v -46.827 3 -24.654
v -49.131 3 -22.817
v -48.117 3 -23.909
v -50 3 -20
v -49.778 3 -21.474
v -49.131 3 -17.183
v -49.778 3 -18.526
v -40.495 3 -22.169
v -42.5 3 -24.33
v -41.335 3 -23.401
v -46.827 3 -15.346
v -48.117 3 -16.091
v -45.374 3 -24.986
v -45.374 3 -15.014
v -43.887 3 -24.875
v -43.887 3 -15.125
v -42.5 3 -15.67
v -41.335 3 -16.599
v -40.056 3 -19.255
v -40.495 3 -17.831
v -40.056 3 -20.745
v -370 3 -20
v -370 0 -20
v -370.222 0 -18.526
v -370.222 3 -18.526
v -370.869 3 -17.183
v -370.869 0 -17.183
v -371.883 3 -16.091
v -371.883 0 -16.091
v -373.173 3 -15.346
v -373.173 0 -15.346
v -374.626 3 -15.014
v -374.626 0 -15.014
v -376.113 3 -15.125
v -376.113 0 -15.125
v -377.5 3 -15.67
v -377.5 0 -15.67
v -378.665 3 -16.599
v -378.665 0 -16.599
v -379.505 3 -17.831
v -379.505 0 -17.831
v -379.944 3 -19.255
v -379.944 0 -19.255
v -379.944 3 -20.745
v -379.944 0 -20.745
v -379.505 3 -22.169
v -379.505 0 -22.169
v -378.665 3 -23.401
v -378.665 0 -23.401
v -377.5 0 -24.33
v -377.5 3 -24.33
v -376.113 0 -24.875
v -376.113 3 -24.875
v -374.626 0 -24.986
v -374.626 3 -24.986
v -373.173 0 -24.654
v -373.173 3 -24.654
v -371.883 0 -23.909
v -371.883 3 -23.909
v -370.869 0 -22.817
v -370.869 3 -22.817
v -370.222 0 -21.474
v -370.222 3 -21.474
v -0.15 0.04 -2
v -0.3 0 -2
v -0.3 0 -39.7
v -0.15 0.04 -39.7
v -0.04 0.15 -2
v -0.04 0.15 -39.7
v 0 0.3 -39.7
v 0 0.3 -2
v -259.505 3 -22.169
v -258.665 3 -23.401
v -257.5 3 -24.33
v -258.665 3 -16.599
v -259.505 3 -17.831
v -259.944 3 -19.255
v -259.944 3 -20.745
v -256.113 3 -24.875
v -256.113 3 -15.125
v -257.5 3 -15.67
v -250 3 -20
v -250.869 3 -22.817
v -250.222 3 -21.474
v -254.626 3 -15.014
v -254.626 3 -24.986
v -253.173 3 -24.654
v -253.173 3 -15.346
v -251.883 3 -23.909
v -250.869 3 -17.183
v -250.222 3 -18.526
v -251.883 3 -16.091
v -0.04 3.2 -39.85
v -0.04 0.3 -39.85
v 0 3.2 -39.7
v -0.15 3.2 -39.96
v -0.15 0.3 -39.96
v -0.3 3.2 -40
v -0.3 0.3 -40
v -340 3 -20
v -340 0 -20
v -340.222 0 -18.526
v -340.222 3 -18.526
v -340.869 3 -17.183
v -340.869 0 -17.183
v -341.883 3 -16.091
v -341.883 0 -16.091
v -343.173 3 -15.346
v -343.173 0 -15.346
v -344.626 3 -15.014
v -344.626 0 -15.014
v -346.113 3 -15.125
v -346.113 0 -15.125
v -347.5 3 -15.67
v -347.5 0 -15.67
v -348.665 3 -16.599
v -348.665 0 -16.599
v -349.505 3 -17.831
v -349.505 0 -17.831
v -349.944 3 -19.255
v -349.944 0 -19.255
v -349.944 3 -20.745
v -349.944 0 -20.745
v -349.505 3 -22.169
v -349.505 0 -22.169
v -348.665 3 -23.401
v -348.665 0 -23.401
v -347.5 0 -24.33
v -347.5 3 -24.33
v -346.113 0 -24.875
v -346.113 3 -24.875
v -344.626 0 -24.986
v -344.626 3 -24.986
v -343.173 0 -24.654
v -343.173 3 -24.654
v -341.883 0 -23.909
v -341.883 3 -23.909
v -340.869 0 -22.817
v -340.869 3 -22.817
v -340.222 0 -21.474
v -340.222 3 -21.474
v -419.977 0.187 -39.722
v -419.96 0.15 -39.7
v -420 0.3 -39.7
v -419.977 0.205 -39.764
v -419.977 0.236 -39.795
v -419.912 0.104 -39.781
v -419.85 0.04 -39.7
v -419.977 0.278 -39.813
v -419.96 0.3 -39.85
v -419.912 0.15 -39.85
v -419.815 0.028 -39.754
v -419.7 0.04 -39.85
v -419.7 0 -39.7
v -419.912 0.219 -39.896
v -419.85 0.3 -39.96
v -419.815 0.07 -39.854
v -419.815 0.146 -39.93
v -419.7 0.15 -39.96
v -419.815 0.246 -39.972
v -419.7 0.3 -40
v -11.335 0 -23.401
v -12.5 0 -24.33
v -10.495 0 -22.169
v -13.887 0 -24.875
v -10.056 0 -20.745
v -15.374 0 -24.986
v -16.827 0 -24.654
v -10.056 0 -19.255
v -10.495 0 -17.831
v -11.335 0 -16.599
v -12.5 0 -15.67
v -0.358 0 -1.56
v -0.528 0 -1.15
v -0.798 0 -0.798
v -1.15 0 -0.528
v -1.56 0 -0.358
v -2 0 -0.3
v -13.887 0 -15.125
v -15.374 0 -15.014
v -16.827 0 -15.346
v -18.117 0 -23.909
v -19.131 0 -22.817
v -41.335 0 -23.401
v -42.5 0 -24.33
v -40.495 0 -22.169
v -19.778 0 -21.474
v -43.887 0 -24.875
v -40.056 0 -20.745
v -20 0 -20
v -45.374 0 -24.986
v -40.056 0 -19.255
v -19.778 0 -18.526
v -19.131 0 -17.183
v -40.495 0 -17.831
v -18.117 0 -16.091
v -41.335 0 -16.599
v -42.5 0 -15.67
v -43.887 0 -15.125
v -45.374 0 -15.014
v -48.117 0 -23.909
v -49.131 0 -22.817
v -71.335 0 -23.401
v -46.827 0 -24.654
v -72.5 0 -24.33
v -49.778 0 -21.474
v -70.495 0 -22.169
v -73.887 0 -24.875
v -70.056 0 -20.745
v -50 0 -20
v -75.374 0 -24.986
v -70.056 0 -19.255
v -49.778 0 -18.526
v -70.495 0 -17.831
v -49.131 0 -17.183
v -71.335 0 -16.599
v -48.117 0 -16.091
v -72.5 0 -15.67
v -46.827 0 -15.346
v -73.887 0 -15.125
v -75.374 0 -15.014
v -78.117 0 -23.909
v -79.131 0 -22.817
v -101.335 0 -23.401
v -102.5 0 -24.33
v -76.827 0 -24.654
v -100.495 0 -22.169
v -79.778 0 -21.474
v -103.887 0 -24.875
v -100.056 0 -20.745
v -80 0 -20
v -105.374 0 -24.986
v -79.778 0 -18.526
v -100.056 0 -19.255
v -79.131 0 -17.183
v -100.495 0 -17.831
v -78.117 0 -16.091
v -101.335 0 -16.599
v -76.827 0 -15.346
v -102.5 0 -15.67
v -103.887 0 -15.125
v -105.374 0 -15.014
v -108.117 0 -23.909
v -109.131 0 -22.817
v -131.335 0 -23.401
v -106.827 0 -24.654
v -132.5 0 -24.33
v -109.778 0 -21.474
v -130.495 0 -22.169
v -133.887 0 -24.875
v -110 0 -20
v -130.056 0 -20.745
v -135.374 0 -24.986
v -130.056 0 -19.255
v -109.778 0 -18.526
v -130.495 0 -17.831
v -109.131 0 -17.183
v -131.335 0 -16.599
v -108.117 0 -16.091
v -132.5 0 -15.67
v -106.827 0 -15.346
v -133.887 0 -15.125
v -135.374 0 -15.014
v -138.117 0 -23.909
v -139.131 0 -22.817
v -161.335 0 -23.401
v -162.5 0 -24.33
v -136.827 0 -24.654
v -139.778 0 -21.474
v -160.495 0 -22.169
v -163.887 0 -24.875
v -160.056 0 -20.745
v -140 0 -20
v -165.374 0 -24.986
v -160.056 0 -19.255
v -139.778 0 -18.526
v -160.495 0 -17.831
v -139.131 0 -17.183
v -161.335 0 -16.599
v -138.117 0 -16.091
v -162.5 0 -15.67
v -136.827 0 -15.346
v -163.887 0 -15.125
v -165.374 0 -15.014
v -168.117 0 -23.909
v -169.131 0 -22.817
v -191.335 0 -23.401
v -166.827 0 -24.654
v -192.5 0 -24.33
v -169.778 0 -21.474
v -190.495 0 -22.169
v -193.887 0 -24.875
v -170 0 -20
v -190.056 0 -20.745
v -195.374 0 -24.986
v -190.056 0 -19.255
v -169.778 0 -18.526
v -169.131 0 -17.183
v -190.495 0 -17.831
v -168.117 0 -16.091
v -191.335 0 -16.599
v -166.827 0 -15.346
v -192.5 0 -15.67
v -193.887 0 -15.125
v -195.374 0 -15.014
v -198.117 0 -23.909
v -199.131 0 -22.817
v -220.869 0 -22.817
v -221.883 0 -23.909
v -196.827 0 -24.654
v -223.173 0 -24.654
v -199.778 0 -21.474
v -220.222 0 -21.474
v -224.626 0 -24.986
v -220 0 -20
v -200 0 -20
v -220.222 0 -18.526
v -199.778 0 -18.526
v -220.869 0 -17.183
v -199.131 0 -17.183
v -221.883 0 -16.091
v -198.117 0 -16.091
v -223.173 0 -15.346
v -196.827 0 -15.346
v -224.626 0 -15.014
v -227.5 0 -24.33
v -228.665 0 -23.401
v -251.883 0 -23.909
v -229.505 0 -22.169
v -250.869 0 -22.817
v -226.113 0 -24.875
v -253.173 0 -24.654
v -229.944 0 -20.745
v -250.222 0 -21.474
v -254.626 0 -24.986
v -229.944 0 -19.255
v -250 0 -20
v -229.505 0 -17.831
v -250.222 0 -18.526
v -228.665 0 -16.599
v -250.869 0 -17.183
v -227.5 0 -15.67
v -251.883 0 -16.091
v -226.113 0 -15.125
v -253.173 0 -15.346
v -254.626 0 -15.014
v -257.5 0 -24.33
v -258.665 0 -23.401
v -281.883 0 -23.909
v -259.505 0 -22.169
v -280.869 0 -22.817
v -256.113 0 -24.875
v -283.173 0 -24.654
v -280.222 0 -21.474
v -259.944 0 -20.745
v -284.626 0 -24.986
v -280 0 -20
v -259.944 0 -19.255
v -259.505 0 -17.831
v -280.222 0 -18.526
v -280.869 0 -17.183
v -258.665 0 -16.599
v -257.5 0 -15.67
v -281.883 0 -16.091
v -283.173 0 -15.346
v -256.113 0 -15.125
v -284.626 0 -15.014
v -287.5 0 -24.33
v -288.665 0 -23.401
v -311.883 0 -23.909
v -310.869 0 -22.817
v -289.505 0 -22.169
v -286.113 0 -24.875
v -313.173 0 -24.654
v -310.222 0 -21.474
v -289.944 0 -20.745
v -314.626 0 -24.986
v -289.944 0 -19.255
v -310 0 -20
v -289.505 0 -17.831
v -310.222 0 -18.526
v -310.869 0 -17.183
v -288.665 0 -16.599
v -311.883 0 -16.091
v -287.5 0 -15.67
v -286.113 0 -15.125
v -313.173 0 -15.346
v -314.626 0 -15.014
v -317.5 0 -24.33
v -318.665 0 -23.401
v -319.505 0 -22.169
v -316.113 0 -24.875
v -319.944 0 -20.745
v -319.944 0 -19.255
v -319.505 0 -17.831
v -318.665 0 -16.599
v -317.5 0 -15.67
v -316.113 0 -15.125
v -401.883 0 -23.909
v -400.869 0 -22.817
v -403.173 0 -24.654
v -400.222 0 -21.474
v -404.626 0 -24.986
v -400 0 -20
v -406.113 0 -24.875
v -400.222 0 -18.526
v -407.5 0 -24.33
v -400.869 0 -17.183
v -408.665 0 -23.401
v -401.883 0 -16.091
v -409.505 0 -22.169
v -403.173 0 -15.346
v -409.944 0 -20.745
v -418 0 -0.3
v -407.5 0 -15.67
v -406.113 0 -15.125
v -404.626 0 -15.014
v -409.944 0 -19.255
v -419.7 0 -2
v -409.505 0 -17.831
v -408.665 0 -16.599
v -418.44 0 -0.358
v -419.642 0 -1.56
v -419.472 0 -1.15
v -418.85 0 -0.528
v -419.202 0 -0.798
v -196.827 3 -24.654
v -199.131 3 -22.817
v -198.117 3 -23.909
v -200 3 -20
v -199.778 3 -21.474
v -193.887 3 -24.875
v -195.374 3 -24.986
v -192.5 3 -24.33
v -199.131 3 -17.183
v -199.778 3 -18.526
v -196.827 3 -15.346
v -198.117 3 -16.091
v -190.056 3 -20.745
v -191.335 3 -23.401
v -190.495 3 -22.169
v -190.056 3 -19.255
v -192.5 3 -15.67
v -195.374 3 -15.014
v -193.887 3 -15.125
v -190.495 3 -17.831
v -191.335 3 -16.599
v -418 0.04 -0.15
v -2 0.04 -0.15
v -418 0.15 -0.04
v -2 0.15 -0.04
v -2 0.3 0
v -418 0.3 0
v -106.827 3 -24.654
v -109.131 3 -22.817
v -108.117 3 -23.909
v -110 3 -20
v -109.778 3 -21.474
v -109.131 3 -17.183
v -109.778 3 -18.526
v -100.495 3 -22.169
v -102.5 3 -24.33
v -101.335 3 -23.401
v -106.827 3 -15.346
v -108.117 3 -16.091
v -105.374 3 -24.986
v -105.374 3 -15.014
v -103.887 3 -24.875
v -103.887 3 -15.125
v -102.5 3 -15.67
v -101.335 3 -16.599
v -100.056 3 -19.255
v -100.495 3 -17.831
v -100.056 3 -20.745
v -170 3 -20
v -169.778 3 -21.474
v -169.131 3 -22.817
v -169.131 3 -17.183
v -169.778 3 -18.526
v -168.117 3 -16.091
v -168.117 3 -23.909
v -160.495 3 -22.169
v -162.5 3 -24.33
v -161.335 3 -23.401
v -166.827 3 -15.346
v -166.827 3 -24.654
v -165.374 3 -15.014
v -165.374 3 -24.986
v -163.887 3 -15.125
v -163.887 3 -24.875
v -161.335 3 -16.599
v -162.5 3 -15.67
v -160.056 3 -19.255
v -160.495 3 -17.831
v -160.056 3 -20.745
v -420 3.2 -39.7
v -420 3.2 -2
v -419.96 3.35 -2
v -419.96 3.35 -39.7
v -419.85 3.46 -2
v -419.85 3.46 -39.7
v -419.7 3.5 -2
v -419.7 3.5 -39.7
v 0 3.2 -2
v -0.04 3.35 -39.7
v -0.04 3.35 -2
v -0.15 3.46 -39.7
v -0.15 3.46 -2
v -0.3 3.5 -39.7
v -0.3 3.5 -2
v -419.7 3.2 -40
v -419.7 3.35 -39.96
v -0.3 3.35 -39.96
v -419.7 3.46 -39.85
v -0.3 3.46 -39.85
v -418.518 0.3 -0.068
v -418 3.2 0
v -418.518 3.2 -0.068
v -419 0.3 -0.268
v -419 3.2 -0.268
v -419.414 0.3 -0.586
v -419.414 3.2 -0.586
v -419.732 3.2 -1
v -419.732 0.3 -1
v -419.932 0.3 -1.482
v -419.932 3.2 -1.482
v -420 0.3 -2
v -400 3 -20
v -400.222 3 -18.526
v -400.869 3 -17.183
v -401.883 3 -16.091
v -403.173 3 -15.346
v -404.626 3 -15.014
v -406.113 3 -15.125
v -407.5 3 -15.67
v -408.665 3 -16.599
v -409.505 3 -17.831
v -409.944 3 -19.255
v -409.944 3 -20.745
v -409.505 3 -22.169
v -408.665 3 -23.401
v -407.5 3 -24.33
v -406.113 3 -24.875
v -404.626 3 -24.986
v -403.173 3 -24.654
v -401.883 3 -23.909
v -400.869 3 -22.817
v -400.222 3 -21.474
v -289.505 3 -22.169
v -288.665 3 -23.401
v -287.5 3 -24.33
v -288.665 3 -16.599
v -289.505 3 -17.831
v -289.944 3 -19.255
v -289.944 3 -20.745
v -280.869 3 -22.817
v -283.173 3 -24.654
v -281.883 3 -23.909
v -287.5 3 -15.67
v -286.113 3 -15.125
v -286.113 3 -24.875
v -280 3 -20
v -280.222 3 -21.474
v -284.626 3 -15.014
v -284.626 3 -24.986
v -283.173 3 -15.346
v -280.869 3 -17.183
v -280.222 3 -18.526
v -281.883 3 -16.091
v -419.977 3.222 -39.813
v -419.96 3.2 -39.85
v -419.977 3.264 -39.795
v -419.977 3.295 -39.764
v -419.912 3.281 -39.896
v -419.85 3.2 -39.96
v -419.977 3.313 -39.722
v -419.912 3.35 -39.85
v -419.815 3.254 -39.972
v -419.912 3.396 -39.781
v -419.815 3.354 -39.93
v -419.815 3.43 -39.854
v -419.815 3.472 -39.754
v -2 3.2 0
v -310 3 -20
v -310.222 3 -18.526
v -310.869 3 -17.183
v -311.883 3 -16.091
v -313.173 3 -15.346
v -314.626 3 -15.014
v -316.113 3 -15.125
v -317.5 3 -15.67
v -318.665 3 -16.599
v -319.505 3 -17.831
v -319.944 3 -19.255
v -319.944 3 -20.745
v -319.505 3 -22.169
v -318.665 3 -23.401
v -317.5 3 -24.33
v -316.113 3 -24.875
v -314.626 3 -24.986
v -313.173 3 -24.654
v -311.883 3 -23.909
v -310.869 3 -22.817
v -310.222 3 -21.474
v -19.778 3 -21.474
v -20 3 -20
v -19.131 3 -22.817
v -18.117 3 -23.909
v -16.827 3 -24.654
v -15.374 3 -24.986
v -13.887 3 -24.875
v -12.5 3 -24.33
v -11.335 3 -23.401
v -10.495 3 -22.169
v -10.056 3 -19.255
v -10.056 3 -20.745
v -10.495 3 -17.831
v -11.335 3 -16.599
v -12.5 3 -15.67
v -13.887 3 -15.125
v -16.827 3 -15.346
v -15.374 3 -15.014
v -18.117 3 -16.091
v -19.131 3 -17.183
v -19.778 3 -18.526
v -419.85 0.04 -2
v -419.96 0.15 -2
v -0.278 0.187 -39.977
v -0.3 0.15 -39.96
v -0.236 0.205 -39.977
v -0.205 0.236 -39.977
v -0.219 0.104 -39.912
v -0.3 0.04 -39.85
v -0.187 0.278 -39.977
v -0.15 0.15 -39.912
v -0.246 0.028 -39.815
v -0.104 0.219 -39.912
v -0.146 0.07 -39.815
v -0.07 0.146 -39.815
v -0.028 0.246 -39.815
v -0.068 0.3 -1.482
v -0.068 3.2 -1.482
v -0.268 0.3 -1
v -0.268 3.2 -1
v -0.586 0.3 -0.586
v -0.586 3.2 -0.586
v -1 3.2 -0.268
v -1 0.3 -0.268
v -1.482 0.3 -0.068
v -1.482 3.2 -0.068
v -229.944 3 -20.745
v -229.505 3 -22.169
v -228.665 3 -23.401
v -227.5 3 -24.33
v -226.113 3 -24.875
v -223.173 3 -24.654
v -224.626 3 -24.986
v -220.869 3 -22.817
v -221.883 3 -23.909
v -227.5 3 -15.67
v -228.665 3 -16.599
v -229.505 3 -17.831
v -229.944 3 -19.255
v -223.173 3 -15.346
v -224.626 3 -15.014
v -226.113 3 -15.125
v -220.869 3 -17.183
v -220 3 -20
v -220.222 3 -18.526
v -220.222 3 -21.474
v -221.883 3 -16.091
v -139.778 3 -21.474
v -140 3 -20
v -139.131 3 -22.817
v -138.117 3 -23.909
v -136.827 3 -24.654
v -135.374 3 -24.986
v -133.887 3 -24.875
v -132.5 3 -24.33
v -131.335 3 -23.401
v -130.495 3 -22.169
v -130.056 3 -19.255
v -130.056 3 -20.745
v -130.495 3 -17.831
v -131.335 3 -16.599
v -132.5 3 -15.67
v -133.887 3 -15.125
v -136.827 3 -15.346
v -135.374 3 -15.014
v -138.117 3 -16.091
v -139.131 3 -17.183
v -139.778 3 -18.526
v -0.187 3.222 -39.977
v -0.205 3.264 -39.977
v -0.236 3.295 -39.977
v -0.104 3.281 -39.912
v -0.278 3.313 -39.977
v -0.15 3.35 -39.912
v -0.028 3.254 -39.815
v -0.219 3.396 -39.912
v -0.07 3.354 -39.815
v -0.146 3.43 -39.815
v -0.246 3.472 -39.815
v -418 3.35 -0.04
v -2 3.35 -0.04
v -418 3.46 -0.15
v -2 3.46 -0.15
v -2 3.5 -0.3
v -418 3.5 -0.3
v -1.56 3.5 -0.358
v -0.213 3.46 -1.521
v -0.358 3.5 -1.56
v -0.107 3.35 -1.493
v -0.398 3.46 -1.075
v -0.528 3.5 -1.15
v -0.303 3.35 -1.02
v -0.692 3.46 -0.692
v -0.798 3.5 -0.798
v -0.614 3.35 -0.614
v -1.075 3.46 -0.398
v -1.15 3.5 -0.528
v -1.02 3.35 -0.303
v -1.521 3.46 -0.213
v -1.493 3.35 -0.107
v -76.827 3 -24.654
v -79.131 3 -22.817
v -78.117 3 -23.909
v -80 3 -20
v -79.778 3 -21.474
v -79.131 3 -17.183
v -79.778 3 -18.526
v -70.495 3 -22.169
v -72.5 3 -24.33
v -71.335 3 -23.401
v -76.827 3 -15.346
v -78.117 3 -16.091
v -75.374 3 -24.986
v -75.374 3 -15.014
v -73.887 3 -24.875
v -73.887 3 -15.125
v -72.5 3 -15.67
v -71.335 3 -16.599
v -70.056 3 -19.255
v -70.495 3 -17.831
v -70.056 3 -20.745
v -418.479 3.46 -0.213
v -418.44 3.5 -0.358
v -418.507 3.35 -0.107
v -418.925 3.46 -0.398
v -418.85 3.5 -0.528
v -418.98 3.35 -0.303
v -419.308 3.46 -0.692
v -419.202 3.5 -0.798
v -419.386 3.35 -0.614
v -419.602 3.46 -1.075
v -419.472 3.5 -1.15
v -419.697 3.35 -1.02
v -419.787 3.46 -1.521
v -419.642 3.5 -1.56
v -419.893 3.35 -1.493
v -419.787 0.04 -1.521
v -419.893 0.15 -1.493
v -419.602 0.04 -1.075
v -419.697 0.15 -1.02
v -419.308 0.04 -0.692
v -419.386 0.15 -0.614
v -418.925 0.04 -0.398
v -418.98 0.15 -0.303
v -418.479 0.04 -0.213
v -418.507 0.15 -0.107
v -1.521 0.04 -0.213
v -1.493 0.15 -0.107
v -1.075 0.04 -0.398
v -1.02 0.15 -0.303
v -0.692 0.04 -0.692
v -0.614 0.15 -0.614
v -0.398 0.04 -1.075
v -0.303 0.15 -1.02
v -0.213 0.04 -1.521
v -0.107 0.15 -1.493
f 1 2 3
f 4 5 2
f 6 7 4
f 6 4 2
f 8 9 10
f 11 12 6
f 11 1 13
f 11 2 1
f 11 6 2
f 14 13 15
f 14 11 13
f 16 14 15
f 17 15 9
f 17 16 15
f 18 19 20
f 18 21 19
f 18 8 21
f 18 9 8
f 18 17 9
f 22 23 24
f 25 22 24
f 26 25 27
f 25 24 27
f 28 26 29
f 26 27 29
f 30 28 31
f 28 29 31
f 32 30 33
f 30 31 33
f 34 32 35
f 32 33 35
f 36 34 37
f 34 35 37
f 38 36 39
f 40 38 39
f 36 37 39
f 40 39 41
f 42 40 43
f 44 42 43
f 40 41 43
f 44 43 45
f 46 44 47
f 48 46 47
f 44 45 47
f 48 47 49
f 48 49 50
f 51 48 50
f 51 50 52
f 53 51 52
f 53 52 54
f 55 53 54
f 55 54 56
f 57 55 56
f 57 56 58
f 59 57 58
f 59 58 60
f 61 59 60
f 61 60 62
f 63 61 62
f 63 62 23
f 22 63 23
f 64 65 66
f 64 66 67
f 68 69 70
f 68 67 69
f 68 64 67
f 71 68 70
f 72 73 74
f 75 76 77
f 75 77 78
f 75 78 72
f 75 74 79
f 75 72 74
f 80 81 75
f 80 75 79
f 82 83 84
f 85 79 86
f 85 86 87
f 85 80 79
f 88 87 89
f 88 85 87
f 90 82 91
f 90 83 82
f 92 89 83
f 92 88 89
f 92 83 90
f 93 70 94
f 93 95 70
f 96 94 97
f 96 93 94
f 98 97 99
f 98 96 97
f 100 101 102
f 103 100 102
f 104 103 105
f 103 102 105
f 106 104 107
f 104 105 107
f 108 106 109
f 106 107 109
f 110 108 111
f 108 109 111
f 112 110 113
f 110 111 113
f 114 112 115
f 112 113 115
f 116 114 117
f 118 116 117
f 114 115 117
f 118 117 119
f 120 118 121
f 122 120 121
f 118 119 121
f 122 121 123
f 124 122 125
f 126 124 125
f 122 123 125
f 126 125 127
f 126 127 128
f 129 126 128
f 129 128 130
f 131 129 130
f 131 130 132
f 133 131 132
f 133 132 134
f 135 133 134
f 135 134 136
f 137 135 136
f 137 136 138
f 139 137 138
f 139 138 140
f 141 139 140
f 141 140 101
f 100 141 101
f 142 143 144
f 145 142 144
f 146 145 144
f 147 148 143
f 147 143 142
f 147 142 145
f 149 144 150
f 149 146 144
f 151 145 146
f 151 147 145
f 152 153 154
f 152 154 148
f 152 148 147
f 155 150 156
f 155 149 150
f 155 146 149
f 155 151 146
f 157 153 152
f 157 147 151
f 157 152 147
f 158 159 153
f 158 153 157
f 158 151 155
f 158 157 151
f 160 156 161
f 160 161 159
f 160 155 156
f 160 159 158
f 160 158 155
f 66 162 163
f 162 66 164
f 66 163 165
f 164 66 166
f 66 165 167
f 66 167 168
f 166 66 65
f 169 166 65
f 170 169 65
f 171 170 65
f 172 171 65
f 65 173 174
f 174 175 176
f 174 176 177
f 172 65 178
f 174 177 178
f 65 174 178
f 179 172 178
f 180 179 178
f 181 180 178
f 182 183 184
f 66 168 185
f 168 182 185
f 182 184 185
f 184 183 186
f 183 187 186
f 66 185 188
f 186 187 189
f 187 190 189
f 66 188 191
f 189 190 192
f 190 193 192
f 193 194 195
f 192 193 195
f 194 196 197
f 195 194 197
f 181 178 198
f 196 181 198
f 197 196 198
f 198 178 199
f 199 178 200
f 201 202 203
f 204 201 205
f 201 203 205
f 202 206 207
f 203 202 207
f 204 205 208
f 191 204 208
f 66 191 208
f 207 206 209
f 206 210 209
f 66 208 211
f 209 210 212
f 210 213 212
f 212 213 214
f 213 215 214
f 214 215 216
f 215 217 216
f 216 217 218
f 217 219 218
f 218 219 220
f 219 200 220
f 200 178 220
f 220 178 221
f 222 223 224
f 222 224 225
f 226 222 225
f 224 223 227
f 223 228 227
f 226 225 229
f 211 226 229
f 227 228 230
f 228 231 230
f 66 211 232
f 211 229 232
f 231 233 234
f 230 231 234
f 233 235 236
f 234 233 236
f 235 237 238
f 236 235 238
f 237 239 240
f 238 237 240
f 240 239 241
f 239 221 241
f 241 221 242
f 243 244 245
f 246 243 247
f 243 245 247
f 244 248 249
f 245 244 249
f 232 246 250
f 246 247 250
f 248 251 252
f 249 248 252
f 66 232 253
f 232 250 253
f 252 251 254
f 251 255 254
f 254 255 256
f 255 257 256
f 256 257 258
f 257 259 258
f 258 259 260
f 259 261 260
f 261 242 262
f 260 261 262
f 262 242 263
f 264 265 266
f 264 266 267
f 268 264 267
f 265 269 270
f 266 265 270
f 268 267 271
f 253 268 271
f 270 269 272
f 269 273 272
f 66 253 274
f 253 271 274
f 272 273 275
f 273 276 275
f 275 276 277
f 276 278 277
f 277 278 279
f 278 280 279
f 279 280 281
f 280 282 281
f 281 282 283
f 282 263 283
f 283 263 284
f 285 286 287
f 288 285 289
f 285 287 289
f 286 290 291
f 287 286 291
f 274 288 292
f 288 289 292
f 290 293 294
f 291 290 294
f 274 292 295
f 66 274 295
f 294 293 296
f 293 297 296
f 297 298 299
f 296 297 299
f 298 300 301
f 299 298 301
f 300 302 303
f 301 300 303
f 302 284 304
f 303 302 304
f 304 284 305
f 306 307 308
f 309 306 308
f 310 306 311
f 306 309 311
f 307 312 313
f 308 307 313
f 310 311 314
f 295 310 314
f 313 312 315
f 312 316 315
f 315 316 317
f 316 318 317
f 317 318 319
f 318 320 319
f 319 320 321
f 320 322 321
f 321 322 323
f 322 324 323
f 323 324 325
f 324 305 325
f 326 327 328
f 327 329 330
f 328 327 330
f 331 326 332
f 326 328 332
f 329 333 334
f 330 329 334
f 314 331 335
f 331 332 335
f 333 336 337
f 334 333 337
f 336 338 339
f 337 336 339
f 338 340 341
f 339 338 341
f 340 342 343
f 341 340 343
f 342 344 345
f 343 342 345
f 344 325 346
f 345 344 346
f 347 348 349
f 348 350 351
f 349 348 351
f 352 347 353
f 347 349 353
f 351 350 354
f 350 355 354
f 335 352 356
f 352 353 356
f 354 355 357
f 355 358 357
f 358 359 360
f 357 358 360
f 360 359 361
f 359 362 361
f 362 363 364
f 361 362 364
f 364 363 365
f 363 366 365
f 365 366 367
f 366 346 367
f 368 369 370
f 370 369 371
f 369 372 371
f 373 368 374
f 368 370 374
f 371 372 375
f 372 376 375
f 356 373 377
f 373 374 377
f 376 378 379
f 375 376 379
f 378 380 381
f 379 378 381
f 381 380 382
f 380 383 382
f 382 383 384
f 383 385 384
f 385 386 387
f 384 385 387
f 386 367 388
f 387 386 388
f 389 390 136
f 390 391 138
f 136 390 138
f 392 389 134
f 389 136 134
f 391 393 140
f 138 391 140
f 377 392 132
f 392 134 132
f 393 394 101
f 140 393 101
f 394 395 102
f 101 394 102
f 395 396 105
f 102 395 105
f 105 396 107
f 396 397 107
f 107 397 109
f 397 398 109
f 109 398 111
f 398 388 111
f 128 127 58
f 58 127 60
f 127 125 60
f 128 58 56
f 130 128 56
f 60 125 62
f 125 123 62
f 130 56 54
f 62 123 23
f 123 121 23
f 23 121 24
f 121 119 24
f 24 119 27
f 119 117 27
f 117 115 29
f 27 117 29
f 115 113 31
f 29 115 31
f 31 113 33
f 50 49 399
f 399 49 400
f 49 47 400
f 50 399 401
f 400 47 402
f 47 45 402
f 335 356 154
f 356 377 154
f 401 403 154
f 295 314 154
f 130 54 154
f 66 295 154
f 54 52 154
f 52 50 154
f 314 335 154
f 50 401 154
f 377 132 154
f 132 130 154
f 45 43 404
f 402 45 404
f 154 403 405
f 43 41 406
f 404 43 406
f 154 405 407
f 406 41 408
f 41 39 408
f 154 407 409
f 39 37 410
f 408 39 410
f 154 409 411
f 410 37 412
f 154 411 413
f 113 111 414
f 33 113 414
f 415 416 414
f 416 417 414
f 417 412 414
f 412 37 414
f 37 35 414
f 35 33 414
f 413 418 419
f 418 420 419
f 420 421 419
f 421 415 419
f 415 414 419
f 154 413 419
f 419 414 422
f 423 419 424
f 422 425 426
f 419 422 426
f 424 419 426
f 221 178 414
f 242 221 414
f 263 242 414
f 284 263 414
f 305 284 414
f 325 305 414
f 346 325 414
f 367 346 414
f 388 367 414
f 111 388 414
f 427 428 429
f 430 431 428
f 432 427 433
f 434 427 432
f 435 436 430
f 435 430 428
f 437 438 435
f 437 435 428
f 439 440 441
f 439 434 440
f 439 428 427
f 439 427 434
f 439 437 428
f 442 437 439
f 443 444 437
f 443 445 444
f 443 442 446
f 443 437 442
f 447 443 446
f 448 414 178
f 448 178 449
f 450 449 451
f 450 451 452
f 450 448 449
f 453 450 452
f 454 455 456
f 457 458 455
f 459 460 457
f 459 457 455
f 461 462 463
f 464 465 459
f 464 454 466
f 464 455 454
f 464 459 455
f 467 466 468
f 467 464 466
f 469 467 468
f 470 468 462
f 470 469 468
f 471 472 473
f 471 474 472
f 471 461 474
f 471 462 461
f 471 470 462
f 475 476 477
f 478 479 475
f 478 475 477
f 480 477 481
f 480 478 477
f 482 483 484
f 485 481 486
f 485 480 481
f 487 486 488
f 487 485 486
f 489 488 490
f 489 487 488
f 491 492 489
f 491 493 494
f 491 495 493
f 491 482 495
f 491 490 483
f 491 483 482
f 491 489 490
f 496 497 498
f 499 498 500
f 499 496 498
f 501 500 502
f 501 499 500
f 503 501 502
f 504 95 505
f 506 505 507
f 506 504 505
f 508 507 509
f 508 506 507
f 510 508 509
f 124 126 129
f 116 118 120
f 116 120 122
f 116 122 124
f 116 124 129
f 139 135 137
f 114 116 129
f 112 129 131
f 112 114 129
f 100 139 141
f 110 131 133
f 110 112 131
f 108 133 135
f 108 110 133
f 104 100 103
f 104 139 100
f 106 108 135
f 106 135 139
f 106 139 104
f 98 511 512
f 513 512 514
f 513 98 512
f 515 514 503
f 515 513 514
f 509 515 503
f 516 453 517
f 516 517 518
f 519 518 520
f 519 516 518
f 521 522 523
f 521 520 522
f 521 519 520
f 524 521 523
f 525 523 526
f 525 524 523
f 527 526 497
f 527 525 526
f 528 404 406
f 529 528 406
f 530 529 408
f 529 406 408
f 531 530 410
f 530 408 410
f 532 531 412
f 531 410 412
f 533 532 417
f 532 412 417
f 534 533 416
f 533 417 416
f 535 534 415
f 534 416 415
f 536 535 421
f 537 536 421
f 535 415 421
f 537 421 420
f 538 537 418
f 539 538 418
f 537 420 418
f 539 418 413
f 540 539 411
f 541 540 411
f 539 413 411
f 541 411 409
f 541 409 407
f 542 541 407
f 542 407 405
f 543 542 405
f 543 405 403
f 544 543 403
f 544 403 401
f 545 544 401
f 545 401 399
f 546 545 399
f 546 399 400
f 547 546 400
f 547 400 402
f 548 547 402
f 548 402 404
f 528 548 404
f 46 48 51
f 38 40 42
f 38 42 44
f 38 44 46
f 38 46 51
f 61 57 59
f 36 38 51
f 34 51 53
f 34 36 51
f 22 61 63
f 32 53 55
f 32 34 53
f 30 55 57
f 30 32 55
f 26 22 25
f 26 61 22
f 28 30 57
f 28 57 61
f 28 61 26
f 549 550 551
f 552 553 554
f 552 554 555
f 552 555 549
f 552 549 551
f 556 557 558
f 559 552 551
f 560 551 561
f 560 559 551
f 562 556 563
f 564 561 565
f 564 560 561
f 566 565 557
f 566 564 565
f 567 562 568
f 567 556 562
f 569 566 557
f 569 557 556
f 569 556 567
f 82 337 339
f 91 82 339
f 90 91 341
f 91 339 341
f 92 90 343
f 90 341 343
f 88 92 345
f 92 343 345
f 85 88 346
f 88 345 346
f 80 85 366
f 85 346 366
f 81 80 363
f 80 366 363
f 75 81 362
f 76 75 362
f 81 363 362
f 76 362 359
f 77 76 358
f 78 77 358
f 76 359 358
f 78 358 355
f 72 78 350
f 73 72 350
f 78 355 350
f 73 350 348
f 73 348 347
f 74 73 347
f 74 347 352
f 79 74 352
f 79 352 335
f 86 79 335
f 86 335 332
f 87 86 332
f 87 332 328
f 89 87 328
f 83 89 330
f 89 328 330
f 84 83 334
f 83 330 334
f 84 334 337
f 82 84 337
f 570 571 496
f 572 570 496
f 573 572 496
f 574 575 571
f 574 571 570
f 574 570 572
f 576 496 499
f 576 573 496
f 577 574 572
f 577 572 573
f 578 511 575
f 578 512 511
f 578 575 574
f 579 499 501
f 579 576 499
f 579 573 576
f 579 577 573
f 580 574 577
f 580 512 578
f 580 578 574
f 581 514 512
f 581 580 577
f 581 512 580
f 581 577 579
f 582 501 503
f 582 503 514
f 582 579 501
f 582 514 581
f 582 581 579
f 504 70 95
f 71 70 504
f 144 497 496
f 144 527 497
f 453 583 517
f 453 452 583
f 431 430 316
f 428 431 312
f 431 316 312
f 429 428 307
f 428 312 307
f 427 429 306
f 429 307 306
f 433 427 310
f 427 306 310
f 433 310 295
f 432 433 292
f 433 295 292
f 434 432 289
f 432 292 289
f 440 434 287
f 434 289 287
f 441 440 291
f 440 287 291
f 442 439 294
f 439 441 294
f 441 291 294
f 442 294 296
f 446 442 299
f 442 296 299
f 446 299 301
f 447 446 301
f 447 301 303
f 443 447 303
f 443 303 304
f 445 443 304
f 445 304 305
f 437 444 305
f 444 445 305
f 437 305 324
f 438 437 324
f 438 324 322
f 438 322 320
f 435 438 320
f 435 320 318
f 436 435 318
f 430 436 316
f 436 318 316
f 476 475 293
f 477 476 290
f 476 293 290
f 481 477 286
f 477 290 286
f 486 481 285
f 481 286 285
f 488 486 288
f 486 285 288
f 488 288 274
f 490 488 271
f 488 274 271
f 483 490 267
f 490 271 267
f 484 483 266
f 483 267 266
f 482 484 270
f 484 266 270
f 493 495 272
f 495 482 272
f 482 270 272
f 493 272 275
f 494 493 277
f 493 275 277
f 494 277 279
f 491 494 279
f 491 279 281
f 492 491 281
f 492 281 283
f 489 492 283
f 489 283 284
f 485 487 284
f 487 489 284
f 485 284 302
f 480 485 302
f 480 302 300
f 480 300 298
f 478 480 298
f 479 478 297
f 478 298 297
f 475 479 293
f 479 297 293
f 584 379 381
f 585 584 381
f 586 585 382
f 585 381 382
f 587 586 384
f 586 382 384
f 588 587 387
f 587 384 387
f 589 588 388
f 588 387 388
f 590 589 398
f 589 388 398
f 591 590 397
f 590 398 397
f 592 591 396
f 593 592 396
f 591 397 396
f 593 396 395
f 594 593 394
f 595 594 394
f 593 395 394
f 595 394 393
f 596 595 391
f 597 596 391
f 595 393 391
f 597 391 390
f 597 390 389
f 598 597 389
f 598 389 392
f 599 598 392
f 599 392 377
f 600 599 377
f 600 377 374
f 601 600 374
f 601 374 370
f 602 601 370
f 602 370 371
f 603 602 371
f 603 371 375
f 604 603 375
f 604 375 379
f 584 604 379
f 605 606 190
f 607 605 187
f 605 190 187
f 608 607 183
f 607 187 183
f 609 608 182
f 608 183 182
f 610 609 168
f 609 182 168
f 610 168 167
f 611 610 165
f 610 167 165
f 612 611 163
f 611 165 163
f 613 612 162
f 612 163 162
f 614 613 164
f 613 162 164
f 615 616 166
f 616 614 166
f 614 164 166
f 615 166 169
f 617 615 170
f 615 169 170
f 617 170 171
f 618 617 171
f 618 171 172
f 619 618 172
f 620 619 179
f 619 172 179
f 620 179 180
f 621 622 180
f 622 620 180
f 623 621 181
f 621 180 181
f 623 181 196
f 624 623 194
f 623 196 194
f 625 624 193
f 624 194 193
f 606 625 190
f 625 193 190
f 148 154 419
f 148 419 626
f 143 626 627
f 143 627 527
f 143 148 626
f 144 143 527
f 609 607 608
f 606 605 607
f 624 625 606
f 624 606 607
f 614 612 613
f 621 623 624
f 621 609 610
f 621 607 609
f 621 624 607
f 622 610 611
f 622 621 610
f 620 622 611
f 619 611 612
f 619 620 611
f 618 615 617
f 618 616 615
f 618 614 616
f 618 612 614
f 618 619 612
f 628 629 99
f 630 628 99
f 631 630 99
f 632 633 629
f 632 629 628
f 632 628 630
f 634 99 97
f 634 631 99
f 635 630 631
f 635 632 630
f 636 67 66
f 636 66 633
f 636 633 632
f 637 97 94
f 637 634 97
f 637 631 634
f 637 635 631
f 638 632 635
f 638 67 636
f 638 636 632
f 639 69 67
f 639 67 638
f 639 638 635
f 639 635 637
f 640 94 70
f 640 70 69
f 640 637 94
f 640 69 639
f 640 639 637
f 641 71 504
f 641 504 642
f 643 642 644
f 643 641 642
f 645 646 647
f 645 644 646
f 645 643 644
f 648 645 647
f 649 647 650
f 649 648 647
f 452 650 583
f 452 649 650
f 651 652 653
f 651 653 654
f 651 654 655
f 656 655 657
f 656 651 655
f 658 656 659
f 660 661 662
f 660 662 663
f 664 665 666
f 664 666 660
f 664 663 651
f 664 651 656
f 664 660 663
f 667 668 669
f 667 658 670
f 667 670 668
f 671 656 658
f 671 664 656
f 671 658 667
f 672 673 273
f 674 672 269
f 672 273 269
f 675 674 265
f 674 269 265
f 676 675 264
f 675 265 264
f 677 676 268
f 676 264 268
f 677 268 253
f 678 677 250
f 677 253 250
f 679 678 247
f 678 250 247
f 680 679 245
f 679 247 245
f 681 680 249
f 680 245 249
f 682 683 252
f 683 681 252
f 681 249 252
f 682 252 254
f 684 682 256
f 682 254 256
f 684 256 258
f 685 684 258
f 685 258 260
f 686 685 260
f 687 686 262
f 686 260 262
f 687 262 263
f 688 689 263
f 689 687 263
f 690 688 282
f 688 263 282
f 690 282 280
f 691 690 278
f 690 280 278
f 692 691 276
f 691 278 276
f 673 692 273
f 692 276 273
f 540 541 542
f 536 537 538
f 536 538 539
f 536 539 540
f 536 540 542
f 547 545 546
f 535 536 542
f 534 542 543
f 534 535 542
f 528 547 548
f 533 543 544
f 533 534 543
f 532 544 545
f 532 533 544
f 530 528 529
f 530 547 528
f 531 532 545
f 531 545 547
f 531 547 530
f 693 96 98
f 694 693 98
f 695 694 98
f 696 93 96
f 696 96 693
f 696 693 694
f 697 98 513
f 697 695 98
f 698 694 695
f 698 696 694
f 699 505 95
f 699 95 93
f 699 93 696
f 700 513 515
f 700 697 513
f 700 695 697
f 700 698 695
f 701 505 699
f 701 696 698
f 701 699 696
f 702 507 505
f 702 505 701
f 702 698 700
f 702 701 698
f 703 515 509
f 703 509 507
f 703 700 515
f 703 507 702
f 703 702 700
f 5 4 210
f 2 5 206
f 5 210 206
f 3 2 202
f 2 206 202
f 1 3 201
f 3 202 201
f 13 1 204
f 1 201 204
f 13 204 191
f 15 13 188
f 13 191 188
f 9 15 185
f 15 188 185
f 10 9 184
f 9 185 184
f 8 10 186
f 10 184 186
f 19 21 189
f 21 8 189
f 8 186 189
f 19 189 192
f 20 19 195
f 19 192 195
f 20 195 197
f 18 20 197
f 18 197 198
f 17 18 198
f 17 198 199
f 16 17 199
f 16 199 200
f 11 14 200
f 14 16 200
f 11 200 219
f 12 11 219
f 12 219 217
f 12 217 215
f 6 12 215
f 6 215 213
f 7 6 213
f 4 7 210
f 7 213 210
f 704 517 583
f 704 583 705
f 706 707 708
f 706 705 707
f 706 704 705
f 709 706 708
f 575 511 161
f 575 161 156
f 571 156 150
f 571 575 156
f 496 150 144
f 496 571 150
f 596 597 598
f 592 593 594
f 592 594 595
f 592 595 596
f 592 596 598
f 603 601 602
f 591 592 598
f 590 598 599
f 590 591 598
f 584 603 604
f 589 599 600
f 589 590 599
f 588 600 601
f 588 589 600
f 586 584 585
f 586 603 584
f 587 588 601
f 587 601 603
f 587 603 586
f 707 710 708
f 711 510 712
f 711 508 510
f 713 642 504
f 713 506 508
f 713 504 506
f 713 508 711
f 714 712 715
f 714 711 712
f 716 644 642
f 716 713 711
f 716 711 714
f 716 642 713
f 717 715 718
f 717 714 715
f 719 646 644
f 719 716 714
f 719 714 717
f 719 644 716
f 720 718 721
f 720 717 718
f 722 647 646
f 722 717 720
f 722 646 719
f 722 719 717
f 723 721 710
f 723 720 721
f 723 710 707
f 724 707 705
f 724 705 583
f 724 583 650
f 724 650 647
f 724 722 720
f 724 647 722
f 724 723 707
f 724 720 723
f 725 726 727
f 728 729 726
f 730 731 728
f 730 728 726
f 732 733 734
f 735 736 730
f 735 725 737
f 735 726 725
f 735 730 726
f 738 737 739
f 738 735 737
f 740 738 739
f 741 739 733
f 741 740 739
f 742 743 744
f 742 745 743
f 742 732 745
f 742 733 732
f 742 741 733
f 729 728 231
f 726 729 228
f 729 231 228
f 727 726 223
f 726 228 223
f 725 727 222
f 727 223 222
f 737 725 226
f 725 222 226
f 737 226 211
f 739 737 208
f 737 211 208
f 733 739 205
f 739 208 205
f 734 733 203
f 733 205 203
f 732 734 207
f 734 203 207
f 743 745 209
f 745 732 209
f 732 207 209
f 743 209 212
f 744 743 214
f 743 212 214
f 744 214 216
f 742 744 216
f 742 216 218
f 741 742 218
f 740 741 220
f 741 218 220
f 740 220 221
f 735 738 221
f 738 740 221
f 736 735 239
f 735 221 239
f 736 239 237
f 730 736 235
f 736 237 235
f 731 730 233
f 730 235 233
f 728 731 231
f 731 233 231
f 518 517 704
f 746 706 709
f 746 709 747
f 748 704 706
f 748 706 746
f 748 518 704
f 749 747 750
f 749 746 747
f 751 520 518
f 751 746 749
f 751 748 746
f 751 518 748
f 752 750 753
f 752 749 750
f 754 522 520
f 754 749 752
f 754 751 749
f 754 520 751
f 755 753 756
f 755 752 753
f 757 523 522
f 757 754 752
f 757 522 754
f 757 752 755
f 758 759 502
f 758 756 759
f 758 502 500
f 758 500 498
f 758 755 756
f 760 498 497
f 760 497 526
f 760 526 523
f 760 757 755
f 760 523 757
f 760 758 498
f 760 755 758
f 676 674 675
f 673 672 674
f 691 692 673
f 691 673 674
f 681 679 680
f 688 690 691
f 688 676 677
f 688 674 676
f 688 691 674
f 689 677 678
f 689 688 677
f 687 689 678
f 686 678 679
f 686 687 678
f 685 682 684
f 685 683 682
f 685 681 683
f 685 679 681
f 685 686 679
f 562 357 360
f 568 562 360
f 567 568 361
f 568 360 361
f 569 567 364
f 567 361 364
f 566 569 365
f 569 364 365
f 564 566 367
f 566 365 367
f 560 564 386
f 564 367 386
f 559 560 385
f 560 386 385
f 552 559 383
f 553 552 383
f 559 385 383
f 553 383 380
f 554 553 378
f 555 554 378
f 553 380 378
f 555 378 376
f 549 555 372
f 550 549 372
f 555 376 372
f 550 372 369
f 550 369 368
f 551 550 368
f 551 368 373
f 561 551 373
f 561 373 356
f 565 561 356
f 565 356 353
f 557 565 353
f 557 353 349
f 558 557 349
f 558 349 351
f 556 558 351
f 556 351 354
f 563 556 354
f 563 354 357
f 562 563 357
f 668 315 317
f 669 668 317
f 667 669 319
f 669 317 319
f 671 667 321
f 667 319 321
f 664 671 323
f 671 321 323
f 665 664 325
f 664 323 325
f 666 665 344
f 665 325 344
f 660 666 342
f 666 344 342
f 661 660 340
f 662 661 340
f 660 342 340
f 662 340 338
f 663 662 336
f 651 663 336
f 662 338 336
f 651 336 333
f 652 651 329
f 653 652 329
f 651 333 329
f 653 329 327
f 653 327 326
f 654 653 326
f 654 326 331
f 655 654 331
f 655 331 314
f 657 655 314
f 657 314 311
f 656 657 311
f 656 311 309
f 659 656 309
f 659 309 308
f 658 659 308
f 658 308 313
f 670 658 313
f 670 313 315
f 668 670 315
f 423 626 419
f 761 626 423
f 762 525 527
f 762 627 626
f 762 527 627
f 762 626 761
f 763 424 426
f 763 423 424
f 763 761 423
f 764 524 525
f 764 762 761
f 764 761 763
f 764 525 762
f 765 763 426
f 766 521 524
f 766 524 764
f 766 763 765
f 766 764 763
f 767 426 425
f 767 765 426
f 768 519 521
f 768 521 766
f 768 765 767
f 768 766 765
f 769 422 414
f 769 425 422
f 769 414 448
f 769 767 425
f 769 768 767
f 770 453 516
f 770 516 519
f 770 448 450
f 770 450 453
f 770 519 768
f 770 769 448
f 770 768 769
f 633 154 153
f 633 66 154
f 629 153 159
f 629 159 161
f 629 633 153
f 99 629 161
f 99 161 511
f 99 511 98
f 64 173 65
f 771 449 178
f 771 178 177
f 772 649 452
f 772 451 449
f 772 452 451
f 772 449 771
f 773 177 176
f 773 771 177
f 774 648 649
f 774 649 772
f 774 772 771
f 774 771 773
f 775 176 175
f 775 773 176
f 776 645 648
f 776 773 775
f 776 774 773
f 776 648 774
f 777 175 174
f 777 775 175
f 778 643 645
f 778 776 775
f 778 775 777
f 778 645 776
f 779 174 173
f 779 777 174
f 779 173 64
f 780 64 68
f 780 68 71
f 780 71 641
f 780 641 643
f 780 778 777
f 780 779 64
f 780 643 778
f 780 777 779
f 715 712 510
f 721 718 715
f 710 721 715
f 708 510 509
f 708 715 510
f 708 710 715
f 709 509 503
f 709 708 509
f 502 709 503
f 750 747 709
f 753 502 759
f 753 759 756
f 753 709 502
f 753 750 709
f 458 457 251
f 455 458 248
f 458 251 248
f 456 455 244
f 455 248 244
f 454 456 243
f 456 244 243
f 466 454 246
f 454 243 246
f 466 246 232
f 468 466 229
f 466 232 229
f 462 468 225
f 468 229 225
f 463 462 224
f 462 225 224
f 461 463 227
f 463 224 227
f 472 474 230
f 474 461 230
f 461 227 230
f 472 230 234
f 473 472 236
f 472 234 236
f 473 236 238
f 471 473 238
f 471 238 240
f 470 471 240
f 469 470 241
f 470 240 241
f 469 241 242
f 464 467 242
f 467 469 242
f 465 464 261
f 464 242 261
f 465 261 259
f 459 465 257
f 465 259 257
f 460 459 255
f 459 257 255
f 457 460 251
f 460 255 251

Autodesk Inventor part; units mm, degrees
ref_plane "YZ Plane" through (0, 0, 0) normal (1, 0, 0) x (0, 1, 0)
ref_plane "XZ Plane" through (0, 0, 0) normal (0, 1, 0) x (-1, 0, 0)
sketch "Sketch1" plane through (0, 0, 0) normal (0, 1, 0) x (-1, 0, 0)
  line L0 (0, 0) -> (420, 0)
  line L1 (420, 0) -> (420, -40)
  line L2 (420, -40) -> (0, -40)
  line L3 (0, -40) -> (0, 0)
  dimension "d0" = 420
  dimension "d1" = 40
extrude "Extrusion1" add sketch "Sketch1" along normal blind 3.5
fillet "Fillet1" radius 0.3 10 edges at (-210, 3.5, 0) (-210, 0, 0) (0, 0, -20) (0, 3.5, -20) (0, 1.75, -40) (-210, 3.5, -40) (-210, 0, -40) (-420, 0, -20) (-420, 1.75, -40) (-420, 3.5, -20)
sketch "Sketch2" plane through (0, 0, 0) normal (0, -1, 0) x (1, 0, 0)
  line L0 (-419.7, -39.7) -> (-419.7, -0.3) projected
  line L1 (-419.7, -20) -> (0, -20)
  circle A0 centre (-405, -20) radius 5
  circle A1 centre (-375, -20) radius 5
  circle A2 centre (-345, -20) radius 5
  circle A3 centre (-315, -20) radius 5
  line L2 (-420, 0) -> (-420, -39.7) projected
  line L3 (-315, -20) -> (-315, -8.0411)
  line L4 (-210.3, -20) -> (-630, -20)
  circle A4 centre (-225, -20) radius 5
  circle A5 centre (-255, -20) radius 5
  circle A6 centre (-285, -20) radius 5
  point P0 (0, 0)
  point P1 (-420, -0.3)
  dimension "d5" = 10
  dimension "d6" = 10
  dimension "d7" = 10
  dimension "d8" = 10
  dimension "d9" = 15
  dimension "d10" = 30
  dimension "d11" = 30
  dimension "d12" = 30
ref_plane "Work Plane1" through (-210, 0.3, -39.7) normal (1, 0, 0) x (0, 0, -1)
extrude "Extrusion2" cut sketch "Sketch2" against normal blind 3
mirror "Mirror1" about plane through (-210, 0.3, -39.7) normal (1, 0, 0) of "Extrusion2"
fillet "Fillet2" radius 2 6 edges at (-0.0879, 3.4121, -0.0879) (-0.0879, 0.0879, -0.0879) (0, 1.75, 0) (-419.9121, 3.4121, -0.0879) (-419.9121, 0.0879, -0.0879) (-420, 1.75, 0)
properties part number "LeftClamo"
